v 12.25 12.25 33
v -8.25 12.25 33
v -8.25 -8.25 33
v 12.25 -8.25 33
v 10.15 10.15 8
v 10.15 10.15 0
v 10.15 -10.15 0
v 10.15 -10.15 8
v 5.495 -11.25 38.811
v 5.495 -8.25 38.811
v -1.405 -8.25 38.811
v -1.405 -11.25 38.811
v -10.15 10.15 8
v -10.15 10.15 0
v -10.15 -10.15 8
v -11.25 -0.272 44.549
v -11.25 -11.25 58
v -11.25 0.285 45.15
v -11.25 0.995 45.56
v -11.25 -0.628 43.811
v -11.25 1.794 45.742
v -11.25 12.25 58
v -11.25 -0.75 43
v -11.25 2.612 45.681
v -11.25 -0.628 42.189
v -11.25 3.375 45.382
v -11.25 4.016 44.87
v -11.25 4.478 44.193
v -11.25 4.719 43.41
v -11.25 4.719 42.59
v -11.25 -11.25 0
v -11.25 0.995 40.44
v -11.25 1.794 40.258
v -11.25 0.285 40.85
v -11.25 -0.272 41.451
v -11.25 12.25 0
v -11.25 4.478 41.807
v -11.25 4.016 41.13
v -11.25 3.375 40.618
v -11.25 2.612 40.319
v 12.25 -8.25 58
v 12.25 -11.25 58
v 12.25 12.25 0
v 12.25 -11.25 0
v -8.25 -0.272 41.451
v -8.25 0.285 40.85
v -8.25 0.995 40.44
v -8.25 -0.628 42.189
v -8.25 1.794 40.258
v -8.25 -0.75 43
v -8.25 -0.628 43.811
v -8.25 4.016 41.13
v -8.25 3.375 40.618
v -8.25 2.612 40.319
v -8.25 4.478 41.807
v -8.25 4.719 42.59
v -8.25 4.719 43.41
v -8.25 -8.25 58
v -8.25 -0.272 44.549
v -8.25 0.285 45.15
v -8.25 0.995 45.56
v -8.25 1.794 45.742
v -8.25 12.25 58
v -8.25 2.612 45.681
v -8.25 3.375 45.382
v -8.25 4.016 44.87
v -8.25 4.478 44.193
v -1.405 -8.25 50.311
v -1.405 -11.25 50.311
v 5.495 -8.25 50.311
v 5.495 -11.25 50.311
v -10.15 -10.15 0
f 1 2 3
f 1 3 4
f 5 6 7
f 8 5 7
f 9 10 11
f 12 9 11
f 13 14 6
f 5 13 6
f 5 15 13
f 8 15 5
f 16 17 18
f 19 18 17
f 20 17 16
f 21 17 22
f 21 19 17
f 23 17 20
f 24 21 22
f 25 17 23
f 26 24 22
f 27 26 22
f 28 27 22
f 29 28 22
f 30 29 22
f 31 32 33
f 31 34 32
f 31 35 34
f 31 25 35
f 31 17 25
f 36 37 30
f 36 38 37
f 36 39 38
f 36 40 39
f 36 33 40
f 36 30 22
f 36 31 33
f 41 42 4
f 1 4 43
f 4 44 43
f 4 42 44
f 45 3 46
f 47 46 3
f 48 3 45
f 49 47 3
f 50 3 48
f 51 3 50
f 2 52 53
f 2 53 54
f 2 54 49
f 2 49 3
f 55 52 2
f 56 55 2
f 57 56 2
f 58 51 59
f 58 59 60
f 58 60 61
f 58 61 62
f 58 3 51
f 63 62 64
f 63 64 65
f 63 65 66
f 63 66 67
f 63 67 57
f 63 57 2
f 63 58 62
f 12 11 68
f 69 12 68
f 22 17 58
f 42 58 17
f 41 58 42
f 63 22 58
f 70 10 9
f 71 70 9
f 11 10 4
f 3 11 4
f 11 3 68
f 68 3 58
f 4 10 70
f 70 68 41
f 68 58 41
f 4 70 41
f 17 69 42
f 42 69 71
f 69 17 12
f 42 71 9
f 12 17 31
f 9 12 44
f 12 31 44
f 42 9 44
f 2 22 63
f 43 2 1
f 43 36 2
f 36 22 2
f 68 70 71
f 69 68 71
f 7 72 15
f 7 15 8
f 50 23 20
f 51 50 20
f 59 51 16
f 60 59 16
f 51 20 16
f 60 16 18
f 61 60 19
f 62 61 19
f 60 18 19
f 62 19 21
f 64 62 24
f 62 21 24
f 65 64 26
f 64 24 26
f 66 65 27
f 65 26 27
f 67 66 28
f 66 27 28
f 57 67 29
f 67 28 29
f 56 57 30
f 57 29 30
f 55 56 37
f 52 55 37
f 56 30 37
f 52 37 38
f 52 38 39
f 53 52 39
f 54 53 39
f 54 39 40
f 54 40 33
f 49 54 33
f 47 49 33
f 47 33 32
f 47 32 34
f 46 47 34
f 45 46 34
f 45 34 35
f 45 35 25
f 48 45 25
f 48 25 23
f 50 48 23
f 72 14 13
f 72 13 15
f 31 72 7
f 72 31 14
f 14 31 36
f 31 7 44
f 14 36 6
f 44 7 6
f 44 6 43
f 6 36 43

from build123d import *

# Parameters (mm, degrees)
F0_W      = 24.5
F0_H      = 24.5
F1_DEPTH  = 58
F2_W      = 20.3
F2_H      = 20.3
F3_DEPTH  = 6
F4_W      = 20.5
F4_H      = 20.5
F5_DEPTH  = 30
F7_D      = 5.5
F8_W      = 6.4
F8_H      = 10
F9_DEPTH  = 25
F10_DEPTH = 5
F11_DEPTH = 0.25
F12_DEPTH = 0.25
F13_DEPTH = 1.5
F14_DEPTH = 1
F15_DEPTH = 1
F16_DEPTH = 2


with BuildPart() as f1:
    # F0 (on Top) → F1 (new body)
    with BuildSketch(Plane.XY):
        Rectangle(F0_W, F0_H)
    extrude(amount=F1_DEPTH)

    # F2 (on face) → F3 (cut)
    with BuildSketch(Plane(origin=(0, 0, 0), x_dir=(1, 0, 0), z_dir=(0, 0, -1))):
        Rectangle(F2_W, F2_H)
    extrude(amount=-F3_DEPTH, mode=Mode.SUBTRACT)

    # F4 (on face) → F5 (cut)
    with BuildSketch(Plane.XY.offset(58)):
        with Locations((2, 2)):
            Rectangle(F4_W, F4_H)
    extrude(amount=-F5_DEPTH, mode=Mode.SUBTRACT)

    # F7 (through all)
    with Locations(Plane.YZ.offset(-8.25)):
        with Locations((2, 43)):
            Hole(F7_D / 2)

    # F8 (on face) → F9 (cut)
    with BuildSketch(Plane(origin=(0, -8.25, 0), x_dir=(-1, 0, 0), z_dir=(0, 1, 0))):
        with Locations((-2.0447701301, 43.8107866645)):
            Rectangle(F8_W, F8_H)
    extrude(amount=-F9_DEPTH, mode=Mode.SUBTRACT)

    # F10 (add): a face of the model
    f10_faces = [f1.faces().sort_by_distance(p)[0] for p in [
        (2, 2, 28),
    ]]
    extrude(f10_faces, amount=F10_DEPTH)

    # F11 (cut): a face of the model
    f11_faces = [f1.faces().sort_by_distance(p)[0] for p in [
        (-1.1552298699, -10.25, 43.8107866645),
    ]]
    extrude(f11_faces, amount=-F11_DEPTH, mode=Mode.SUBTRACT)

    # F12 (cut): a face of the model
    f12_faces = [f1.faces().sort_by_distance(p)[0] for p in [
        (5.2447701301, -10.25, 43.8107866645),
    ]]
    extrude(f12_faces, amount=-F12_DEPTH, mode=Mode.SUBTRACT)

    # F13 (cut): a face of the model
    f13_faces = [f1.faces().sort_by_distance(p)[0] for p in [
        (2.0447701301, -10.25, 48.8107866645),
    ]]
    extrude(f13_faces, amount=-F13_DEPTH, mode=Mode.SUBTRACT)

    # F14 (cut): a face of the model
    f14_faces = [f1.faces().sort_by_distance(p)[0] for p in [
        (-12.25, -0.0340074224, 28.7619480432),
    ]]
    extrude(f14_faces, amount=-F14_DEPTH, mode=Mode.SUBTRACT)

    # F15 (cut): a face of the model
    f15_faces = [f1.faces().sort_by_distance(p)[0] for p in [
        (0.4045086201, -12.25, 28.0380957256),
    ]]
    extrude(f15_faces, amount=-F15_DEPTH, mode=Mode.SUBTRACT)

    # F16 (cut): a face of the model
    f16_faces = [f1.faces().sort_by_distance(p)[0] for p in [
        (0, 0, 6),
    ]]
    extrude(f16_faces, amount=-F16_DEPTH, mode=Mode.SUBTRACT)


solid = f1.part
